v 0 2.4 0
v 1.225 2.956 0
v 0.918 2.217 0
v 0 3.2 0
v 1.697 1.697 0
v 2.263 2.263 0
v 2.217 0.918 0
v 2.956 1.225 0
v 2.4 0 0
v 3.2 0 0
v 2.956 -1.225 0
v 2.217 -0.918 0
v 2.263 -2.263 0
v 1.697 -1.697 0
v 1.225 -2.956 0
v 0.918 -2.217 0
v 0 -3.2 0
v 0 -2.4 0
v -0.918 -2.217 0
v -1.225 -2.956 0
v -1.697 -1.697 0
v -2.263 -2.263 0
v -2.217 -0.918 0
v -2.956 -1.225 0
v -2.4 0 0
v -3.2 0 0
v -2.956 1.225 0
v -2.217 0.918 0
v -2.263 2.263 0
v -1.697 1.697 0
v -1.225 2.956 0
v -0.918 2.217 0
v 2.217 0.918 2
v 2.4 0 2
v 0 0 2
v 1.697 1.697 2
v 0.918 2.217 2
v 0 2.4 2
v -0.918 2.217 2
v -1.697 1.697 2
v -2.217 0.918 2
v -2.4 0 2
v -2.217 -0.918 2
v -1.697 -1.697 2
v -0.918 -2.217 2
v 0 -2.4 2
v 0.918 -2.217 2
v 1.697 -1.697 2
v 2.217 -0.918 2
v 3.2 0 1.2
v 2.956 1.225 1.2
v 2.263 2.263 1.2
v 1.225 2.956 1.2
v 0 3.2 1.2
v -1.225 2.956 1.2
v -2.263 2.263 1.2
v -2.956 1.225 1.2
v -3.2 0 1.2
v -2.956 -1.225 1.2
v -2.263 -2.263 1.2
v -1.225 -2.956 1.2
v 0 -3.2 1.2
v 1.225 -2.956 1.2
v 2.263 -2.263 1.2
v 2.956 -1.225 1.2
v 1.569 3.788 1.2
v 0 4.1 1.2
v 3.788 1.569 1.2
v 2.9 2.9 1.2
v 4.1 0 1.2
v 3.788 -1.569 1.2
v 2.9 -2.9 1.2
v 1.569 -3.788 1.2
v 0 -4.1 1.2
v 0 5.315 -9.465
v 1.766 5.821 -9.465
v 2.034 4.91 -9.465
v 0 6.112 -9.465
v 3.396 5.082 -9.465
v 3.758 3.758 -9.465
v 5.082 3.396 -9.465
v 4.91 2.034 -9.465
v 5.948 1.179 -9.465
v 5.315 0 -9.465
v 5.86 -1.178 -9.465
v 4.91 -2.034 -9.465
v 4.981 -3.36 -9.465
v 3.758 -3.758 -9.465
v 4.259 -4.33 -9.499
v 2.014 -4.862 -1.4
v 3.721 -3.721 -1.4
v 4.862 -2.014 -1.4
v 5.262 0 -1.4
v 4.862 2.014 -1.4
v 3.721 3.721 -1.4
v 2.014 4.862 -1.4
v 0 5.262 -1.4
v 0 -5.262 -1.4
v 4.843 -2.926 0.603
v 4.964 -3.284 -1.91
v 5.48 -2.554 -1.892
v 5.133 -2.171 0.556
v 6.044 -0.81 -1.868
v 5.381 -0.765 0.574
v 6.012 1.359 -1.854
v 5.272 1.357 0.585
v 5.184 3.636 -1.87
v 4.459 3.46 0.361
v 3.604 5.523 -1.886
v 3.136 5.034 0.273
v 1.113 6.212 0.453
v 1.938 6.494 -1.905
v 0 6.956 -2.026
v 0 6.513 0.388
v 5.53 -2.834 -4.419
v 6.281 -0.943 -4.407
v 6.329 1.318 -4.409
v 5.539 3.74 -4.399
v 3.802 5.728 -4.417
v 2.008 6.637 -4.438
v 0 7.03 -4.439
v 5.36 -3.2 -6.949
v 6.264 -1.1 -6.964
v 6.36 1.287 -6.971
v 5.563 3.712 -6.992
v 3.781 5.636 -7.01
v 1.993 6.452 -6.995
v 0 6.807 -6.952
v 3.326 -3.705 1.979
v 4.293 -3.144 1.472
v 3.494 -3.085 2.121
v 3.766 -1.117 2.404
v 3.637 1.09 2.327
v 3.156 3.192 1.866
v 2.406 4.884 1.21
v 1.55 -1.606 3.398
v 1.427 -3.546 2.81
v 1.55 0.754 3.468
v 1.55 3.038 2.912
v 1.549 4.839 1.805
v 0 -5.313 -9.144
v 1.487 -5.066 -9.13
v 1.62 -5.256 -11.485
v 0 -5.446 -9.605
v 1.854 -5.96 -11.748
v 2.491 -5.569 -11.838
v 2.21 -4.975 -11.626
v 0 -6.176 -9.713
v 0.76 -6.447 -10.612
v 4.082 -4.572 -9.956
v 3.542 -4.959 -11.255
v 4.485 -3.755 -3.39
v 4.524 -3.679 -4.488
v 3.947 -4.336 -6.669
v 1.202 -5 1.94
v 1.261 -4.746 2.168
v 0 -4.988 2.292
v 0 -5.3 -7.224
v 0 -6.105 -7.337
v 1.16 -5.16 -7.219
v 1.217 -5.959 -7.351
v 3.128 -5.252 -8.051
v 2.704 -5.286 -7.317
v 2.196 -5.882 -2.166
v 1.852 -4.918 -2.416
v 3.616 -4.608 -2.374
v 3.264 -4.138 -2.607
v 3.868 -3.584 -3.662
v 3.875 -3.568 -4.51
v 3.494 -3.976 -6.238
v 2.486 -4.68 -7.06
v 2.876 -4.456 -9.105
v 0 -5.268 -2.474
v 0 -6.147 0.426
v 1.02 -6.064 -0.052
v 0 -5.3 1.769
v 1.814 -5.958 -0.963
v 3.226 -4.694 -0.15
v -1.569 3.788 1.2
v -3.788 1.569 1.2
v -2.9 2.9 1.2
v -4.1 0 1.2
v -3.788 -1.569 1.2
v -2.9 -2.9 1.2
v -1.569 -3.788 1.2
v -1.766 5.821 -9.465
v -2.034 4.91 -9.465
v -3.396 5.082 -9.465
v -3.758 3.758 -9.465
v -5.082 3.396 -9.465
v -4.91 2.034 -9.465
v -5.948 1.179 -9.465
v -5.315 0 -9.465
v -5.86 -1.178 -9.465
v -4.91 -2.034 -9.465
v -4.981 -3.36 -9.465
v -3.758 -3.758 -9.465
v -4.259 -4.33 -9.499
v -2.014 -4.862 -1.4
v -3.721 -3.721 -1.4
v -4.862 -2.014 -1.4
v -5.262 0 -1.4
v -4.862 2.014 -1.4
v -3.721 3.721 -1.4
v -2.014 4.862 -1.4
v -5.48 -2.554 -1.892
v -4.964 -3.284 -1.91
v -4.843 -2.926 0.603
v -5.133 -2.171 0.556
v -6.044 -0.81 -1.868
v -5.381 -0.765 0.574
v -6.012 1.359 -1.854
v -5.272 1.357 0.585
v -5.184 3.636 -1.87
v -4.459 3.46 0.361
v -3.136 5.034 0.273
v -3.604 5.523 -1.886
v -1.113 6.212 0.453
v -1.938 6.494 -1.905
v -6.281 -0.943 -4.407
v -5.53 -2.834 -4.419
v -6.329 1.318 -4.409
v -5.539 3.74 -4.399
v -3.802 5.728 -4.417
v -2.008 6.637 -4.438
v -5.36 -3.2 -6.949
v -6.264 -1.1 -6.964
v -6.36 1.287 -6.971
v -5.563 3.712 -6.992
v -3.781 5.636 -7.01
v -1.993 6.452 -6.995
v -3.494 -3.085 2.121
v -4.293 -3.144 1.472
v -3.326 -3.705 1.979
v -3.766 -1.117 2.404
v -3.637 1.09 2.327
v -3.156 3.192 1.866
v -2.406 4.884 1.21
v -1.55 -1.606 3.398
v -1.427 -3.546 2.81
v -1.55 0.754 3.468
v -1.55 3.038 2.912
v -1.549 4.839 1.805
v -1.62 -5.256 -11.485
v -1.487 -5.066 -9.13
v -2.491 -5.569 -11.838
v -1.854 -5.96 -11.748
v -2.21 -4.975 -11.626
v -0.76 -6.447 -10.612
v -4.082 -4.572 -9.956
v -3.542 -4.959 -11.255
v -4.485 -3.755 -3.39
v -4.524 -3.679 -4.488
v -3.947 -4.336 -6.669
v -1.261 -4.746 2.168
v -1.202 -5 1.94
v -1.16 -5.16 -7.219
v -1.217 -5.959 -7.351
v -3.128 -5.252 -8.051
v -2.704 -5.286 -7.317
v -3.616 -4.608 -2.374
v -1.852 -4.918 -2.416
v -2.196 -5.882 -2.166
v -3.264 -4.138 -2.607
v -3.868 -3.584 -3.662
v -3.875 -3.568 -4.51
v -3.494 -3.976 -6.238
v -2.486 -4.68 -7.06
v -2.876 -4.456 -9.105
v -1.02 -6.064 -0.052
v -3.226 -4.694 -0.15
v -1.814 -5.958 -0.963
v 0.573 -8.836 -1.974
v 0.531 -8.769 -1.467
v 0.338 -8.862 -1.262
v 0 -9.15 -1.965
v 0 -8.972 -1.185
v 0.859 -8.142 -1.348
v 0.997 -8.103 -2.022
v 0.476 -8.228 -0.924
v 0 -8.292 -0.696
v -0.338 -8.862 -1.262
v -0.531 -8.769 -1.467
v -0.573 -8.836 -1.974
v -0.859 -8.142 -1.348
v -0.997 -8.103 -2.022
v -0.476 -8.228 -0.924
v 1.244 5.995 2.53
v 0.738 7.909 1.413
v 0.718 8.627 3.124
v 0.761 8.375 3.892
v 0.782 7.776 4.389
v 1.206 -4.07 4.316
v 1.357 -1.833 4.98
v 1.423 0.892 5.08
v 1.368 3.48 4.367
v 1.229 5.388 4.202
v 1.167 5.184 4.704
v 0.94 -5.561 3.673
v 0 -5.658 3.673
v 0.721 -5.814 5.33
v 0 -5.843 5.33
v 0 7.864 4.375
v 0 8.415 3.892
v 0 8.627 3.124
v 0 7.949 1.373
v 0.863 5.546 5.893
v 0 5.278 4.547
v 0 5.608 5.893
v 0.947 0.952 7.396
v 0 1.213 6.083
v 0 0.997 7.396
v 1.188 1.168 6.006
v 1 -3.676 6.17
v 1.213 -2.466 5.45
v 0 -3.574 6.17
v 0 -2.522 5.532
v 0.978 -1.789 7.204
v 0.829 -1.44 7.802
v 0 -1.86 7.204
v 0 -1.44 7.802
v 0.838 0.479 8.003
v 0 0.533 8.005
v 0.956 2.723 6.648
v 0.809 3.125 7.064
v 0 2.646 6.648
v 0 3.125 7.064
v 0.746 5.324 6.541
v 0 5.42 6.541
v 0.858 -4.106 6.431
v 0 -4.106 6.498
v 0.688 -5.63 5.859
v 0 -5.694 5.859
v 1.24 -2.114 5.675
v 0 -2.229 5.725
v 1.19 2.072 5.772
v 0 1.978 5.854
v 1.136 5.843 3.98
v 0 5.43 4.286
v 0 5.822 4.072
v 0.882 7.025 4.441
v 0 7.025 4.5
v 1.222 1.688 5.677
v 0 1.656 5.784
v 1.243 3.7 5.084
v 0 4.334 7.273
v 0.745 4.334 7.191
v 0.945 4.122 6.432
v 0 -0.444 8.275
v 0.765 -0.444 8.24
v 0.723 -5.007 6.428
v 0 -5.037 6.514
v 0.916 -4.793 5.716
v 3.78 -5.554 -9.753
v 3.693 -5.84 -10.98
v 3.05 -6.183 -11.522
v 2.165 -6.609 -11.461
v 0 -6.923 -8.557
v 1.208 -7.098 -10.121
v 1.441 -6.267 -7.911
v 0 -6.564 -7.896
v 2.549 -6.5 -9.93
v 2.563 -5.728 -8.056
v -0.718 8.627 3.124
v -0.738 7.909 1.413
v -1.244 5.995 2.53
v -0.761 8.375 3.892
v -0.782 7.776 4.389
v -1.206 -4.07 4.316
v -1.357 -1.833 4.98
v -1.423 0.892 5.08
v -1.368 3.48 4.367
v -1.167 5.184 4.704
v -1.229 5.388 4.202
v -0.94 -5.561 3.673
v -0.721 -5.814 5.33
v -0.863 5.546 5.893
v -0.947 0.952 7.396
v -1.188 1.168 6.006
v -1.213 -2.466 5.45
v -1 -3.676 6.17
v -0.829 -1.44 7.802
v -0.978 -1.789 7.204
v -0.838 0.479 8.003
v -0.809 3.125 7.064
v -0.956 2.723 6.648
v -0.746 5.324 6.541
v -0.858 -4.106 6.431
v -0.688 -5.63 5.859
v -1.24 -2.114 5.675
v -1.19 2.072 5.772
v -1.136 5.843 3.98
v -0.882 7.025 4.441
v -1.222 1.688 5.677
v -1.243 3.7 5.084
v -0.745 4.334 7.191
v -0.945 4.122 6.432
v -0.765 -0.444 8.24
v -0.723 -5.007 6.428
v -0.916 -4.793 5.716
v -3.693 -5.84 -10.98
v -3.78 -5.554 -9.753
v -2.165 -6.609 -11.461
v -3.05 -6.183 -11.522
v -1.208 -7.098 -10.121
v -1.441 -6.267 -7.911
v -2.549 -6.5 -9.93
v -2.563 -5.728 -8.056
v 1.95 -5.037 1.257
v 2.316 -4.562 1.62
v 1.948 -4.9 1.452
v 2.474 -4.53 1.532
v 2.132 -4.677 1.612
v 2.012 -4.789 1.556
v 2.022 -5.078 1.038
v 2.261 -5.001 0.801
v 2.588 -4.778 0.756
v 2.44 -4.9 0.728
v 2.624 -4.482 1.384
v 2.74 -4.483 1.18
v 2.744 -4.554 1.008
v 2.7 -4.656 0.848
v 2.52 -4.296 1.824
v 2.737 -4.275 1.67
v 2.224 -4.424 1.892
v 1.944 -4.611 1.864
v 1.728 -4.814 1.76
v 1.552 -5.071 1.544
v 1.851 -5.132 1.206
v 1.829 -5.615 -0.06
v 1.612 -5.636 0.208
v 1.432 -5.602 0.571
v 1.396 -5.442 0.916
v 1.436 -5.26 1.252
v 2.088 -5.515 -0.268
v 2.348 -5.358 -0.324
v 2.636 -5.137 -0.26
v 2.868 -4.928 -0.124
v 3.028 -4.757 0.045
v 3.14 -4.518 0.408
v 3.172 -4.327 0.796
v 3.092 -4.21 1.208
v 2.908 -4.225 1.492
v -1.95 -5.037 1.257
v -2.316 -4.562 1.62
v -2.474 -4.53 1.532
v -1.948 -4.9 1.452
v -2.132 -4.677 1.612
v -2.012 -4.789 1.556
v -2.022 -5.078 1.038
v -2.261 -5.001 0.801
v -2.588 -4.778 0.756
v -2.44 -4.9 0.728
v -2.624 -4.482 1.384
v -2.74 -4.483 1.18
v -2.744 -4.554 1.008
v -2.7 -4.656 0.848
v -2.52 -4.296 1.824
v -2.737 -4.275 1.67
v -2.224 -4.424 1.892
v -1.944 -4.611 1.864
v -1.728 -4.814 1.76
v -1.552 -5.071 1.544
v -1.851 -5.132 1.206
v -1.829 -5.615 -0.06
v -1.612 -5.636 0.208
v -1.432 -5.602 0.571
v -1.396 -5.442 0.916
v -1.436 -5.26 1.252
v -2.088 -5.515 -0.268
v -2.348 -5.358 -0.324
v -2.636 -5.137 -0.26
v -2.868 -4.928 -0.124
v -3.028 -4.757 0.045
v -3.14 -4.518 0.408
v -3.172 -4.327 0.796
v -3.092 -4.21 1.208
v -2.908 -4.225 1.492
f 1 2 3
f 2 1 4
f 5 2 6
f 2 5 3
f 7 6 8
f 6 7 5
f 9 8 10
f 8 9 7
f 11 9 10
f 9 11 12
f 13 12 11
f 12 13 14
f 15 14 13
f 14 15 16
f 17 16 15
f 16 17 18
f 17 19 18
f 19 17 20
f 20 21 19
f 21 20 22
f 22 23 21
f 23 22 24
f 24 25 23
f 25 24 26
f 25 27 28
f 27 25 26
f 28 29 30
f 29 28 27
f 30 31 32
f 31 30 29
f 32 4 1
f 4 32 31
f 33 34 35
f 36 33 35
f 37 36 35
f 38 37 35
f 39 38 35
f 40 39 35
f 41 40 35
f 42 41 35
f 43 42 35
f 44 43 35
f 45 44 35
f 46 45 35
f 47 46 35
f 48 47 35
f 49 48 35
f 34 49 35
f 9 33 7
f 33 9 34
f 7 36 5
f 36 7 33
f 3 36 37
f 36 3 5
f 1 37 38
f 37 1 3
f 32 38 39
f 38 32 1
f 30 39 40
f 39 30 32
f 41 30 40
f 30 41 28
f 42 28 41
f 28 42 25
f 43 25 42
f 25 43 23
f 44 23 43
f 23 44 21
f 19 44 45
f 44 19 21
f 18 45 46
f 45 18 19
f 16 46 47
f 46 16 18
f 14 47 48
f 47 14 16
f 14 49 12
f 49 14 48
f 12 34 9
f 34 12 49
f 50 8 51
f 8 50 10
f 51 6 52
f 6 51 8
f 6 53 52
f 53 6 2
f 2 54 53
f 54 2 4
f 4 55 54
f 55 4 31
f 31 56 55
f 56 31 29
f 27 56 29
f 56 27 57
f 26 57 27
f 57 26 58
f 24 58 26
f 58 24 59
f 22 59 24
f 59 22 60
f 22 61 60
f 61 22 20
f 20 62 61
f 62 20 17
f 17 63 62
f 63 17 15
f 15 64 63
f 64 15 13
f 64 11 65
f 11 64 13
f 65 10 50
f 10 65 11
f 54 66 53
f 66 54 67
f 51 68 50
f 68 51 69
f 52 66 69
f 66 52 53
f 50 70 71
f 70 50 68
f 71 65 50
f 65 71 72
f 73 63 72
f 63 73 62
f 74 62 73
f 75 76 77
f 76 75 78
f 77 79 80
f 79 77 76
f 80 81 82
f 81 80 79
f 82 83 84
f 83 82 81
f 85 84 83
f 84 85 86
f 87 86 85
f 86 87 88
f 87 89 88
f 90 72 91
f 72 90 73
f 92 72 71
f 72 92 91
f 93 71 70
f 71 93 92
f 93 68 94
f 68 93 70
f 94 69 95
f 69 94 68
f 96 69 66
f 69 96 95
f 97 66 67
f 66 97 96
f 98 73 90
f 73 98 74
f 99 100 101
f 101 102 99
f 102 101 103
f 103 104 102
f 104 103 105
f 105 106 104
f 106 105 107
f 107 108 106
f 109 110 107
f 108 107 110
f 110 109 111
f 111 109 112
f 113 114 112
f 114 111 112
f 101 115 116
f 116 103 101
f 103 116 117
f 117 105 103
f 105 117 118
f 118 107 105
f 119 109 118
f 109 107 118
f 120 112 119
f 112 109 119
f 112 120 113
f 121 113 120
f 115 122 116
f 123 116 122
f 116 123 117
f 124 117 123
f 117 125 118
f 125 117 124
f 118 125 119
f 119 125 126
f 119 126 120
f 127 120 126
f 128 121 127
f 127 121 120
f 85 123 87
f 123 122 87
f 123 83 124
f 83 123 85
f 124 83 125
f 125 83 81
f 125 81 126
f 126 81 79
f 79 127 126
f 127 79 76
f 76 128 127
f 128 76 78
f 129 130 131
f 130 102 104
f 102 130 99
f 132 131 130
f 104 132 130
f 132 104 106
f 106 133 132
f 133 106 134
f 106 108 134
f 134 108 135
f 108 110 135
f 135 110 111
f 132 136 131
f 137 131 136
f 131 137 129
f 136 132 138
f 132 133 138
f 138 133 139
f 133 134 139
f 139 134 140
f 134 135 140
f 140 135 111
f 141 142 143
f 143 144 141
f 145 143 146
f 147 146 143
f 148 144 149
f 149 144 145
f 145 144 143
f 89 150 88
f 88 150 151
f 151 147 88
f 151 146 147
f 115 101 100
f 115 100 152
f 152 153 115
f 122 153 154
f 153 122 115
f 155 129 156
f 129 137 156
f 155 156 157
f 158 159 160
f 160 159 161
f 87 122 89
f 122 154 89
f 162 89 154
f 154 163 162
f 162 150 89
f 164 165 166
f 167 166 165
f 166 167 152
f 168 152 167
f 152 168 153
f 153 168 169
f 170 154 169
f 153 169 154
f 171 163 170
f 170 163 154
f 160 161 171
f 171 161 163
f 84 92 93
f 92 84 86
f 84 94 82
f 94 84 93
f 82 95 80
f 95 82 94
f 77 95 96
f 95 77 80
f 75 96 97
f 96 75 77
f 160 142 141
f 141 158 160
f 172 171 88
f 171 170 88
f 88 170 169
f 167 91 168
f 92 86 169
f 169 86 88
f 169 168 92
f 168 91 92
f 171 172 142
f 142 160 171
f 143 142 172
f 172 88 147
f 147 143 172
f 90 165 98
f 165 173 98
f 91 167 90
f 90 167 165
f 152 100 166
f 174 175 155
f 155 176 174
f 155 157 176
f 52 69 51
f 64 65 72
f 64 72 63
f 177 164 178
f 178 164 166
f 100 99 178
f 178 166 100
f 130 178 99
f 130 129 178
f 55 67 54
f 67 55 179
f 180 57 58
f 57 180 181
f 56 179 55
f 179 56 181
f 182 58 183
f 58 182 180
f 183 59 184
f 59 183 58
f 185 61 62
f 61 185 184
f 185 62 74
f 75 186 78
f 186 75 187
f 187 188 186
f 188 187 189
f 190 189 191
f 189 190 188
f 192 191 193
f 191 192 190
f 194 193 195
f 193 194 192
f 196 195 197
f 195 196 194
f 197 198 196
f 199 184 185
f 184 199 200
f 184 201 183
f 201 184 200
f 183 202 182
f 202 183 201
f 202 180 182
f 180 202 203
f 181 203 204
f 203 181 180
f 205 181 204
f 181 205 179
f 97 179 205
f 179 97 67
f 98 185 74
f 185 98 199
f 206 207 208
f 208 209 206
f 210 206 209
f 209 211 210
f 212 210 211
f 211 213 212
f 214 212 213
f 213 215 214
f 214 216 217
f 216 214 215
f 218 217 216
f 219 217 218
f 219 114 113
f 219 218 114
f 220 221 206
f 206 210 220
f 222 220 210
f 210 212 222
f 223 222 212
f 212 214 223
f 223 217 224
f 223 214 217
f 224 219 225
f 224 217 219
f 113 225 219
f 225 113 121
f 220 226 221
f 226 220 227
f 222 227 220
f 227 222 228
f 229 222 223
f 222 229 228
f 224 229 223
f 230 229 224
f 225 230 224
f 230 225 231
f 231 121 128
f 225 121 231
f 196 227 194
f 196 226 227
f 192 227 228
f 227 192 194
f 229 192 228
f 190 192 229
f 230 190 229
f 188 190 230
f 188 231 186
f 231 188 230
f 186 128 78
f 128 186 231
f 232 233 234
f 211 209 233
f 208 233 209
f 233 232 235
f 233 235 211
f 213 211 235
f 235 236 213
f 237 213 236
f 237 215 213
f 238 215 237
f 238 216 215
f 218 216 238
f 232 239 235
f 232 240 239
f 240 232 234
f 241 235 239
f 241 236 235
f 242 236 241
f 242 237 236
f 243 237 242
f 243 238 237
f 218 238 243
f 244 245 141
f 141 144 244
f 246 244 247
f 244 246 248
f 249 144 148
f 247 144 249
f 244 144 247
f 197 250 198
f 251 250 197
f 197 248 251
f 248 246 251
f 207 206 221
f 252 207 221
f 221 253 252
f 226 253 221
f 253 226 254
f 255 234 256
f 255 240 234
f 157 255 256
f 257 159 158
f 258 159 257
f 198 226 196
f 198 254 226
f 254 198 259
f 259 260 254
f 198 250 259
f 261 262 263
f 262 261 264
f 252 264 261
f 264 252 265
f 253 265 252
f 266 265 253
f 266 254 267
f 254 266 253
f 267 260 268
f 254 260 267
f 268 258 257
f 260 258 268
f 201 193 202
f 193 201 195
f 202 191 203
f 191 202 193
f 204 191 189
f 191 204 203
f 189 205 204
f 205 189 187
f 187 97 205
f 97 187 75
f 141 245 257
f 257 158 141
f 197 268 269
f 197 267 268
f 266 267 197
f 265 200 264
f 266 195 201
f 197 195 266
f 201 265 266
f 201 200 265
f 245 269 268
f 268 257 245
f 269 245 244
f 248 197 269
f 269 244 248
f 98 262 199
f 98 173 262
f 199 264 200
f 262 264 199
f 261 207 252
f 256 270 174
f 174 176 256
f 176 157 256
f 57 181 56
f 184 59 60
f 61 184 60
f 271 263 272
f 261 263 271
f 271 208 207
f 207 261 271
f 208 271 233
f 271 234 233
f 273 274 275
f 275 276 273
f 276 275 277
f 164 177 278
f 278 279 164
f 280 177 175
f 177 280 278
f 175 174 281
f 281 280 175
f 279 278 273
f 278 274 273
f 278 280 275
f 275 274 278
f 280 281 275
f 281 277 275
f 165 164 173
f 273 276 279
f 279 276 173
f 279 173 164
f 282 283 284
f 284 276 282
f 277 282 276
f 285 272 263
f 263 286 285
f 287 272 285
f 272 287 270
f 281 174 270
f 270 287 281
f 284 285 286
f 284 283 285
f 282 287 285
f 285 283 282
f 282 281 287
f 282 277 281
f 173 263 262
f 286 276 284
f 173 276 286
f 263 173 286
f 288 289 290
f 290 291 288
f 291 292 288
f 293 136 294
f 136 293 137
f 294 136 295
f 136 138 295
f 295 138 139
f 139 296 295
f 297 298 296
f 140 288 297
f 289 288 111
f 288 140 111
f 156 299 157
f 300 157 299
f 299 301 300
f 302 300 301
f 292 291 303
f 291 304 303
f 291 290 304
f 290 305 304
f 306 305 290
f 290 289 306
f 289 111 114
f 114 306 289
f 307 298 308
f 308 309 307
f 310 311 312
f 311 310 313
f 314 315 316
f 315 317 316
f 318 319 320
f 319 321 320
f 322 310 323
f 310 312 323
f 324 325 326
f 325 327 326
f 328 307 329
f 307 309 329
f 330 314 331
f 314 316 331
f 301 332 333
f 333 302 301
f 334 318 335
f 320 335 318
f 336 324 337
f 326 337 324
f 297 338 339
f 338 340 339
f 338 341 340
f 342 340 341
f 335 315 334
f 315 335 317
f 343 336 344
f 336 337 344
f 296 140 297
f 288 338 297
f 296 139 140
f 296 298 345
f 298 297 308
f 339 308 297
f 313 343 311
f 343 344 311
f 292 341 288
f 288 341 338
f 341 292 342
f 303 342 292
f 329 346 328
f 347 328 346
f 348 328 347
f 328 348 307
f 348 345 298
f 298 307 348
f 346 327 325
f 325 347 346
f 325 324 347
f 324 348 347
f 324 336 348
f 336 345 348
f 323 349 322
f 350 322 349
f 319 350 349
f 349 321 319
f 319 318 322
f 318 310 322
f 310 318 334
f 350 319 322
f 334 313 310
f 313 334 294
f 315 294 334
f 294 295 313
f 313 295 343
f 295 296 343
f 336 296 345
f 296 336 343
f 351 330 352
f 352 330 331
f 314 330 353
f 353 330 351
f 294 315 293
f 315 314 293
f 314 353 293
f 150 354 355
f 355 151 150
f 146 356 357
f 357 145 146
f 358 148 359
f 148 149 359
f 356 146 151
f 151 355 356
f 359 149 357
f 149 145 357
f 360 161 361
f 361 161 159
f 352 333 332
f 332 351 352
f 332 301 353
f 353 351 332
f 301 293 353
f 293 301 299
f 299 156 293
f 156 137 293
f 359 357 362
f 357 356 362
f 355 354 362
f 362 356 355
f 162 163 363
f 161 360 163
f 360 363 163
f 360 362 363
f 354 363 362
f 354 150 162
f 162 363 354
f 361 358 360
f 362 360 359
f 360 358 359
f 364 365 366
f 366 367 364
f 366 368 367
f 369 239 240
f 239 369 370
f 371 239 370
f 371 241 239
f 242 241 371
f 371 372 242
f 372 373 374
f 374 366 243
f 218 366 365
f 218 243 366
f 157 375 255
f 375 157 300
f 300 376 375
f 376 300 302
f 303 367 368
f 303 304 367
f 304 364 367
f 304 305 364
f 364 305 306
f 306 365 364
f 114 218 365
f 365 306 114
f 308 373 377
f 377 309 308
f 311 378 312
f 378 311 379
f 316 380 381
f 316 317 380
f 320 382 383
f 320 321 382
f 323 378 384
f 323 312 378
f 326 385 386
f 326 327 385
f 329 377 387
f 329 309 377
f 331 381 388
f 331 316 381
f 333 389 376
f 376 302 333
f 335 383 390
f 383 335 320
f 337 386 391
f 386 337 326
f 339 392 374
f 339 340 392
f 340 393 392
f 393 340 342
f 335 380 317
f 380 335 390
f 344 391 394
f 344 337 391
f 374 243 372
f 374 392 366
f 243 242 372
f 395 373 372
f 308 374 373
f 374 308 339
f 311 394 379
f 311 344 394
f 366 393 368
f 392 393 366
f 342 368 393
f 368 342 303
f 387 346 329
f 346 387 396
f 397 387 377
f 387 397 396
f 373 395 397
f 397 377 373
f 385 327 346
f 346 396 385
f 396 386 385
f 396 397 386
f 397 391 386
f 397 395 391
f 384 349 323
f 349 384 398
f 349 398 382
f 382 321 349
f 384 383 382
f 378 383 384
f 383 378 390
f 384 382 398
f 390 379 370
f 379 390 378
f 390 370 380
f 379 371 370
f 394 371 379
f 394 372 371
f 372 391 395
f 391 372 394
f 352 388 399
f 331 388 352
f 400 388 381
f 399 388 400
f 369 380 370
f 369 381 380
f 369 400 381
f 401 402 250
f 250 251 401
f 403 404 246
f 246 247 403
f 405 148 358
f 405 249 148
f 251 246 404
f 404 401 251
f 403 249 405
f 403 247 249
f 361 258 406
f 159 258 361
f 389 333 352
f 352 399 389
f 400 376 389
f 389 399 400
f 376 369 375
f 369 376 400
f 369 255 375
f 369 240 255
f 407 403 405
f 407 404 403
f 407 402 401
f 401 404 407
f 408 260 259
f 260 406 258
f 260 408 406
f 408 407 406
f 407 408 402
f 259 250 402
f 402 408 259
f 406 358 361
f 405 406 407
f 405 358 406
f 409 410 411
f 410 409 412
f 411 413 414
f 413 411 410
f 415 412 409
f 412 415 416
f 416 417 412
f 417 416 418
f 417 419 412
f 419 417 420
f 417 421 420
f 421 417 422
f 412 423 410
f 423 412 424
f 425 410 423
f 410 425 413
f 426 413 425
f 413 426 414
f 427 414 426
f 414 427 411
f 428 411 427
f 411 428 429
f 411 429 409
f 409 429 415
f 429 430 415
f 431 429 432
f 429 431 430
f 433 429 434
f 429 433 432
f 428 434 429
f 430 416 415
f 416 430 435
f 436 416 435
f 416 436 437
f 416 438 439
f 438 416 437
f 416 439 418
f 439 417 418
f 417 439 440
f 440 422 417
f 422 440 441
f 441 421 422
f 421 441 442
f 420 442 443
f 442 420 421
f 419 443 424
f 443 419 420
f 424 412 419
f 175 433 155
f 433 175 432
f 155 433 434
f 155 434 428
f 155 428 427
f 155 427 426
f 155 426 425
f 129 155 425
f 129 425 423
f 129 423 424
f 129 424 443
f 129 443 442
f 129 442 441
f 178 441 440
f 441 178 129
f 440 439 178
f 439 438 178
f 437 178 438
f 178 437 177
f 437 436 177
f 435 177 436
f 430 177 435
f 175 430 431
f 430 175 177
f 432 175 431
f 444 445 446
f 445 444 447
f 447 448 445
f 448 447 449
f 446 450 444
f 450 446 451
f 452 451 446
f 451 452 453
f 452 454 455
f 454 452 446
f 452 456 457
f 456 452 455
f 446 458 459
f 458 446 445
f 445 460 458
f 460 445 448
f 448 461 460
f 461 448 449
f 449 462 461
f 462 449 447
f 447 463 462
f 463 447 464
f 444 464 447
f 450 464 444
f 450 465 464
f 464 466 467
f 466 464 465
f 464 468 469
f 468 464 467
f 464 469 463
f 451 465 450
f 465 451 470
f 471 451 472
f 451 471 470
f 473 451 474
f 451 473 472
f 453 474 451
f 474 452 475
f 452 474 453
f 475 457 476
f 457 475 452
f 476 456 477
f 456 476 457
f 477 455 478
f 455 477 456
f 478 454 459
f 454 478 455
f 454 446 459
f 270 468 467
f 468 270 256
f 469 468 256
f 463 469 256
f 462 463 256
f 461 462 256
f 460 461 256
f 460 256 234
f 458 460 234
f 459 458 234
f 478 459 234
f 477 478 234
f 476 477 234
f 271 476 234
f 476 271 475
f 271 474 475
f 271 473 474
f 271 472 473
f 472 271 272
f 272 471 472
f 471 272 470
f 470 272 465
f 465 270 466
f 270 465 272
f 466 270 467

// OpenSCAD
use <../lib.scad>
use <../p/4-4cylo.scad>
use <s/11262s01.scad>
use <s/11262s02.scad>
use <s/11262s03.scad>
use <../p/stud4o.scad>
$fa=1; $fs=0.2;
function ldraw_lib__11262p01(realsolid=false) = [
// 0 Minifig Headdress Chicken with Yellow Beak and Red Comb and Wattles Pattern
// 0 Name: 11262p01.dat
// 0 Author: Philippe Hurbain [Philo]
// 0 !LDRAW_ORG Part UPDATE 2020-02
// 0 !LICENSE Licensed under CC BY 2.0 and CC BY 4.0 : see CAreadme.txt
// 
// 0 BFC CERTIFY CCW
  [0,"BFC","CERTIFY"],
  [0,"BFC","CCW"],
// 
// 0 !CATEGORY Minifig Headwear
// 0 !KEYWORDS Series 9, Suit, Winter Hut
// 
// 0 !HISTORY 2013-08-14 {LEGO Digital Designer} Original part shape
// 0 !HISTORY 2019-05-19 [Philo] File preparation for LDraw Parts Tracker
// 0 !HISTORY 2020-09-05 [PTadmin] Official Update 2020-02
// 
// 
// 1 16 0 -5 0 -1 0 0 0 -1.25 0 0 0 1 stud4o.dat
  [1,16,0,-5,0,-1,0,0,0,-1.25,0,0,0,1, ldraw_lib__stud4o(realsolid)],
// 1 16 0 -3 0 8 0 0 0 3 0 0 0 8 4-4cylo.dat
  [1,16,0,-3,0,8,0,0,0,3,0,0,0,8, ldraw_lib__4_4cylo(realsolid)],
// 1 16 0 0 0 1 0 0 0 1 0 0 0 1 s\11262s01.dat
  [1,16,0,0,0,1,0,0,0,1,0,0,0,1, ldraw_lib__s__11262s01(realsolid)],
// 1 16 0 0 0 -1 0 0 0 1 0 0 0 1 s\11262s01.dat
  [1,16,0,0,0,-1,0,0,0,1,0,0,0,1, ldraw_lib__s__11262s01(realsolid)],
// 1 14 0 0 0 1 0 0 0 1 0 0 0 1 s\11262s02.dat
  [1,14,0,0,0,1,0,0,0,1,0,0,0,1, ldraw_lib__s__11262s02(realsolid)],
// 1 14 0 0 0 -1 0 0 0 1 0 0 0 1 s\11262s02.dat
  [1,14,0,0,0,-1,0,0,0,1,0,0,0,1, ldraw_lib__s__11262s02(realsolid)],
// 1 4 0 0 0 1 0 0 0 1 0 0 0 1 s\11262s03.dat
  [1,4,0,0,0,1,0,0,0,1,0,0,0,1, ldraw_lib__s__11262s03(realsolid)],
// 1 4 0 0 0 -1 0 0 0 1 0 0 0 1 s\11262s03.dat
  [1,4,0,0,0,-1,0,0,0,1,0,0,0,1, ldraw_lib__s__11262s03(realsolid)],
// 0 // eyes
// 4 15 4.87 -3.63 -12.2511 4.8738 -3.1437 -12.5932 6.1842 -3.8302 -11.325 5.79 -4.05 -11.4046
  [4,15,4.87,-3.63,-12.2511,4.8738,-3.1437,-12.5932,6.1842,-3.8302,-11.325,5.79,-4.05,-11.4046],
// 4 15 4.87 -3.63 -12.2511 5.79 -4.05 -11.4046 5.33 -4.03 -11.6933 5.03 -3.89 -11.9715
  [4,15,4.87,-3.63,-12.2511,5.79,-4.05,-11.4046,5.33,-4.03,-11.6933,5.03,-3.89,-11.9715],
// 4 15 6.1842 -3.8302 -11.325 4.8738 -3.1437 -12.5932 5.0544 -2.5943 -12.6949 5.6537 -2.0031 -12.5035
  [4,15,6.1842,-3.8302,-11.325,4.8738,-3.1437,-12.5932,5.0544,-2.5943,-12.6949,5.6537,-2.0031,-12.5035],
// 4 15 6.1842 -3.8302 -11.325 5.6537 -2.0031 -12.5035 6.1 -1.82 -12.2506 6.47 -1.89 -11.9457
  [4,15,6.1842,-3.8302,-11.325,5.6537,-2.0031,-12.5035,6.1,-1.82,-12.2506,6.47,-1.89,-11.9457],
// 4 15 6.56 -3.46 -11.2048 6.1842 -3.8302 -11.325 6.47 -1.89 -11.9457 6.85 -2.95 -11.2083
  [4,15,6.56,-3.46,-11.2048,6.1842,-3.8302,-11.325,6.47,-1.89,-11.9457,6.85,-2.95,-11.2083],
// 4 15 6.86 -2.52 -11.3855 6.85 -2.95 -11.2083 6.47 -1.89 -11.9457 6.75 -2.12 -11.6389
  [4,15,6.86,-2.52,-11.3855,6.85,-2.95,-11.2083,6.47,-1.89,-11.9457,6.75,-2.12,-11.6389],
// 4 0 6.1842 -3.8302 -11.325 6.8429 -4.1753 -10.6875 6.3 -4.56 -10.7391 5.79 -4.05 -11.4046
  [4,0,6.1842,-3.8302,-11.325,6.8429,-4.1753,-10.6875,6.3,-4.56,-10.7391,5.79,-4.05,-11.4046],
// 4 0 5.79 -4.05 -11.4046 6.3 -4.56 -10.7391 5.56 -4.73 -11.0604 5.33 -4.03 -11.6933
  [4,0,5.79,-4.05,-11.4046,6.3,-4.56,-10.7391,5.56,-4.73,-11.0604,5.33,-4.03,-11.6933],
// 4 0 5.33 -4.03 -11.6933 5.56 -4.73 -11.0604 4.86 -4.66 -11.5277 5.03 -3.89 -11.9715
  [4,0,5.33,-4.03,-11.6933,5.56,-4.73,-11.0604,4.86,-4.66,-11.5277,5.03,-3.89,-11.9715],
// 4 0 5.03 -3.89 -11.9715 4.86 -4.66 -11.5277 4.32 -4.4 -12.034 4.87 -3.63 -12.2511
  [4,0,5.03,-3.89,-11.9715,4.86,-4.66,-11.5277,4.32,-4.4,-12.034,4.87,-3.63,-12.2511],
// 4 0 4.87 -3.63 -12.2511 4.32 -4.4 -12.034 3.8798 -3.8609 -12.6785 4.628 -3.015 -12.831
  [4,0,4.87,-3.63,-12.2511,4.32,-4.4,-12.034,3.8798,-3.8609,-12.6785,4.628,-3.015,-12.831],
// 3 0 4.87 -3.63 -12.2511 4.628 -3.015 -12.831 4.8738 -3.1437 -12.5932
  [3,0,4.87,-3.63,-12.2511,4.628,-3.015,-12.831,4.8738,-3.1437,-12.5932],
// 3 0 4.8738 -3.1437 -12.5932 4.628 -3.015 -12.831 5.0544 -2.5943 -12.6949
  [3,0,4.8738,-3.1437,-12.5932,4.628,-3.015,-12.831,5.0544,-2.5943,-12.6949],
// 3 0 4.628 -3.015 -12.831 4.5731 0.1497 -14.0363 5.0544 -2.5943 -12.6949
  [3,0,4.628,-3.015,-12.831,4.5731,0.1497,-14.0363,5.0544,-2.5943,-12.6949],
// 4 0 4.03 -0.52 -14.0908 4.5731 0.1497 -14.0363 4.628 -3.015 -12.831 3.5788 -1.4274 -14.0058
  [4,0,4.03,-0.52,-14.0908,4.5731,0.1497,-14.0363,4.628,-3.015,-12.831,3.5788,-1.4274,-14.0058],
// 4 0 3.49 -2.29 -13.6061 3.5788 -1.4274 -14.0058 4.628 -3.015 -12.831 3.59 -3.13 -13.1494
  [4,0,3.49,-2.29,-13.6061,3.5788,-1.4274,-14.0058,4.628,-3.015,-12.831,3.59,-3.13,-13.1494],
// 3 0 3.8798 -3.8609 -12.6785 3.59 -3.13 -13.1494 4.628 -3.015 -12.831
  [3,0,3.8798,-3.8609,-12.6785,3.59,-3.13,-13.1494,4.628,-3.015,-12.831],
// 4 0 5.6537 -2.0031 -12.5035 5.0544 -2.5943 -12.6949 4.5731 0.1497 -14.0363 5.22 0.67 -13.7863
  [4,0,5.6537,-2.0031,-12.5035,5.0544,-2.5943,-12.6949,4.5731,0.1497,-14.0363,5.22,0.67,-13.7863],
// 4 0 5.6537 -2.0031 -12.5035 5.22 0.67 -13.7863 5.87 0.81 -13.3938 6.59 0.65 -12.8427
  [4,0,5.6537,-2.0031,-12.5035,5.22,0.67,-13.7863,5.87,0.81,-13.3938,6.59,0.65,-12.8427],
// 4 0 5.6537 -2.0031 -12.5035 6.59 0.65 -12.8427 7.17 0.31 -12.3209 7.5711 -0.1113 -11.8914
  [4,0,5.6537,-2.0031,-12.5035,6.59,0.65,-12.8427,7.17,0.31,-12.3209,7.5711,-0.1113,-11.8914],
// 3 0 5.6537 -2.0031 -12.5035 7.5711 -0.1113 -11.8914 6.1 -1.82 -12.2506
  [3,0,5.6537,-2.0031,-12.5035,7.5711,-0.1113,-11.8914,6.1,-1.82,-12.2506],
// 4 0 6.47 -1.89 -11.9457 6.1 -1.82 -12.2506 7.5711 -0.1113 -11.8914 7.85 -1.02 -11.2941
  [4,0,6.47,-1.89,-11.9457,6.1,-1.82,-12.2506,7.5711,-0.1113,-11.8914,7.85,-1.02,-11.2941],
// 4 0 6.75 -2.12 -11.6389 6.47 -1.89 -11.9457 7.85 -1.02 -11.2941 7.93 -1.99 -10.8182
  [4,0,6.75,-2.12,-11.6389,6.47,-1.89,-11.9457,7.85,-1.02,-11.2941,7.93,-1.99,-10.8182],
// 4 0 6.86 -2.52 -11.3855 6.75 -2.12 -11.6389 7.93 -1.99 -10.8182 7.73 -3.02 -10.5246
  [4,0,6.86,-2.52,-11.3855,6.75,-2.12,-11.6389,7.93,-1.99,-10.8182,7.73,-3.02,-10.5246],
// 4 0 6.85 -2.95 -11.2083 6.86 -2.52 -11.3855 7.73 -3.02 -10.5246 7.27 -3.73 -10.5615
  [4,0,6.85,-2.95,-11.2083,6.86,-2.52,-11.3855,7.73,-3.02,-10.5246,7.27,-3.73,-10.5615],
// 4 0 6.56 -3.46 -11.2048 6.85 -2.95 -11.2083 7.27 -3.73 -10.5615 6.8429 -4.1753 -10.6875
  [4,0,6.56,-3.46,-11.2048,6.85,-2.95,-11.2083,7.27,-3.73,-10.5615,6.8429,-4.1753,-10.6875],
// 3 0 6.8429 -4.1753 -10.6875 6.1842 -3.8302 -11.325 6.56 -3.46 -11.2048
  [3,0,6.8429,-4.1753,-10.6875,6.1842,-3.8302,-11.325,6.56,-3.46,-11.2048],
// 4 16 2.549 0.131 -15.159 3.5788 -1.4274 -14.0058 3.49 -2.29 -13.6061 3.004 -4.851 -12.5
  [4,16,2.549,0.131,-15.159,3.5788,-1.4274,-14.0058,3.49,-2.29,-13.6061,3.004,-4.851,-12.5],
// 3 16 3.004 -4.851 -12.5 3.49 -2.29 -13.6061 3.59 -3.13 -13.1494
  [3,16,3.004,-4.851,-12.5,3.49,-2.29,-13.6061,3.59,-3.13,-13.1494],
// 3 16 3.004 -4.851 -12.5 3.59 -3.13 -13.1494 3.8798 -3.8609 -12.6785
  [3,16,3.004,-4.851,-12.5,3.59,-3.13,-13.1494,3.8798,-3.8609,-12.6785],
// 3 16 3.004 -4.851 -12.5 3.8798 -3.8609 -12.6785 4.32 -4.4 -12.034
  [3,16,3.004,-4.851,-12.5,3.8798,-3.8609,-12.6785,4.32,-4.4,-12.034],
// 3 16 3.004 -4.851 -12.5 4.32 -4.4 -12.034 4.86 -4.66 -11.5277
  [3,16,3.004,-4.851,-12.5,4.32,-4.4,-12.034,4.86,-4.66,-11.5277],
// 3 16 3.004 -4.851 -12.5 4.86 -4.66 -11.5277 5.56 -4.73 -11.0604
  [3,16,3.004,-4.851,-12.5,4.86,-4.66,-11.5277,5.56,-4.73,-11.0604],
// 3 16 8.316 -4.947 -9.262 3.004 -4.851 -12.5 5.56 -4.73 -11.0604
  [3,16,8.316,-4.947,-9.262,3.004,-4.851,-12.5,5.56,-4.73,-11.0604],
// 3 16 8.316 -4.947 -9.262 5.56 -4.73 -11.0604 6.3 -4.56 -10.7391
  [3,16,8.316,-4.947,-9.262,5.56,-4.73,-11.0604,6.3,-4.56,-10.7391],
// 3 16 8.316 -4.947 -9.262 6.3 -4.56 -10.7391 6.8429 -4.1753 -10.6875
  [3,16,8.316,-4.947,-9.262,6.3,-4.56,-10.7391,6.8429,-4.1753,-10.6875],
// 3 16 8.316 -4.947 -9.262 6.8429 -4.1753 -10.6875 7.27 -3.73 -10.5615
  [3,16,8.316,-4.947,-9.262,6.8429,-4.1753,-10.6875,7.27,-3.73,-10.5615],
// 3 16 8.316 -4.947 -9.262 7.27 -3.73 -10.5615 7.73 -3.02 -10.5246
  [3,16,8.316,-4.947,-9.262,7.27,-3.73,-10.5615,7.73,-3.02,-10.5246],
// 3 16 8.316 -4.947 -9.262 7.73 -3.02 -10.5246 7.93 -1.99 -10.8182
  [3,16,8.316,-4.947,-9.262,7.73,-3.02,-10.5246,7.93,-1.99,-10.8182],
// 4 16 8.064 0.375 -11.734 8.316 -4.947 -9.262 7.93 -1.99 -10.8182 7.85 -1.02 -11.2941
  [4,16,8.064,0.375,-11.734,8.316,-4.947,-9.262,7.93,-1.99,-10.8182,7.85,-1.02,-11.2941],
// 3 16 7.85 -1.02 -11.2941 7.5711 -0.1113 -11.8914 8.064 0.375 -11.734
  [3,16,7.85,-1.02,-11.2941,7.5711,-0.1113,-11.8914,8.064,0.375,-11.734],
// 3 16 7.5711 -0.1113 -11.8914 7.17 0.31 -12.3209 8.064 0.375 -11.734
  [3,16,7.5711,-0.1113,-11.8914,7.17,0.31,-12.3209,8.064,0.375,-11.734],
// 4 16 8.064 0.375 -11.734 7.17 0.31 -12.3209 6.59 0.65 -12.8427 4.534 2.407 -14.896
  [4,16,8.064,0.375,-11.734,7.17,0.31,-12.3209,6.59,0.65,-12.8427,4.534,2.407,-14.896],
// 3 16 6.59 0.65 -12.8427 5.87 0.81 -13.3938 4.534 2.407 -14.896
  [3,16,6.59,0.65,-12.8427,5.87,0.81,-13.3938,4.534,2.407,-14.896],
// 3 16 5.22 0.67 -13.7863 4.534 2.407 -14.896 5.87 0.81 -13.3938
  [3,16,5.22,0.67,-13.7863,4.534,2.407,-14.896,5.87,0.81,-13.3938],
// 3 16 4.5731 0.1497 -14.0363 4.534 2.407 -14.896 5.22 0.67 -13.7863
  [3,16,4.5731,0.1497,-14.0363,4.534,2.407,-14.896,5.22,0.67,-13.7863],
// 4 16 4.534 2.407 -14.896 4.5731 0.1497 -14.0363 4.03 -0.52 -14.0908 2.549 0.131 -15.159
  [4,16,4.534,2.407,-14.896,4.5731,0.1497,-14.0363,4.03,-0.52,-14.0908,2.549,0.131,-15.159],
// 3 16 3.5788 -1.4274 -14.0058 2.549 0.131 -15.159 4.03 -0.52 -14.0908
  [3,16,3.5788,-1.4274,-14.0058,2.549,0.131,-15.159,4.03,-0.52,-14.0908],
// 5 24 4.628 -3.015 -12.831 3.004 -4.851 -12.5 2.549 0.131 -15.159 8.316 -4.947 -9.262
  [5,24,4.628,-3.015,-12.831,3.004,-4.851,-12.5,2.549,0.131,-15.159,8.316,-4.947,-9.262],
// 5 24 4.628 -3.015 -12.831 4.534 2.407 -14.896 8.064 0.375 -11.734 2.549 0.131 -15.159
  [5,24,4.628,-3.015,-12.831,4.534,2.407,-14.896,8.064,0.375,-11.734,2.549,0.131,-15.159],
// 5 24 8.316 -4.947 -9.262 4.628 -3.015 -12.831 8.064 0.375 -11.734 3.004 -4.851 -12.5
  [5,24,8.316,-4.947,-9.262,4.628,-3.015,-12.831,8.064,0.375,-11.734,3.004,-4.851,-12.5],
// 5 24 4.628 -3.015 -12.831 8.064 0.375 -11.734 4.534 2.407 -14.896 8.316 -4.947 -9.262
  [5,24,4.628,-3.015,-12.831,8.064,0.375,-11.734,4.534,2.407,-14.896,8.316,-4.947,-9.262],
// 5 24 2.549 .131 -15.159 4.628 -3.015 -12.831 3.004 -4.851 -12.5 4.534 2.407 -14.896
  [5,24,2.549,.131,-15.159,4.628,-3.015,-12.831,3.004,-4.851,-12.5,4.534,2.407,-14.896],
// 
// 4 15 -5.79 -4.05 -11.4046 -6.1842 -3.8302 -11.325 -4.8738 -3.1437 -12.5932 -4.87 -3.63 -12.2511
  [4,15,-5.79,-4.05,-11.4046,-6.1842,-3.8302,-11.325,-4.8738,-3.1437,-12.5932,-4.87,-3.63,-12.2511],
// 4 15 -5.03 -3.89 -11.9715 -5.33 -4.03 -11.6933 -5.79 -4.05 -11.4046 -4.87 -3.63 -12.2511
  [4,15,-5.03,-3.89,-11.9715,-5.33,-4.03,-11.6933,-5.79,-4.05,-11.4046,-4.87,-3.63,-12.2511],
// 4 15 -5.6537 -2.0031 -12.5035 -5.0544 -2.5943 -12.6949 -4.8738 -3.1437 -12.5932 -6.1842 -3.8302 -11.325
  [4,15,-5.6537,-2.0031,-12.5035,-5.0544,-2.5943,-12.6949,-4.8738,-3.1437,-12.5932,-6.1842,-3.8302,-11.325],
// 4 15 -6.47 -1.89 -11.9457 -6.1 -1.82 -12.2506 -5.6537 -2.0031 -12.5035 -6.1842 -3.8302 -11.325
  [4,15,-6.47,-1.89,-11.9457,-6.1,-1.82,-12.2506,-5.6537,-2.0031,-12.5035,-6.1842,-3.8302,-11.325],
// 4 15 -6.85 -2.95 -11.2083 -6.47 -1.89 -11.9457 -6.1842 -3.8302 -11.325 -6.56 -3.46 -11.2048
  [4,15,-6.85,-2.95,-11.2083,-6.47,-1.89,-11.9457,-6.1842,-3.8302,-11.325,-6.56,-3.46,-11.2048],
// 4 15 -6.75 -2.12 -11.6389 -6.47 -1.89 -11.9457 -6.85 -2.95 -11.2083 -6.86 -2.52 -11.3855
  [4,15,-6.75,-2.12,-11.6389,-6.47,-1.89,-11.9457,-6.85,-2.95,-11.2083,-6.86,-2.52,-11.3855],
// 4 0 -5.79 -4.05 -11.4046 -6.3 -4.56 -10.7391 -6.8429 -4.1753 -10.6875 -6.1842 -3.8302 -11.325
  [4,0,-5.79,-4.05,-11.4046,-6.3,-4.56,-10.7391,-6.8429,-4.1753,-10.6875,-6.1842,-3.8302,-11.325],
// 4 0 -5.33 -4.03 -11.6933 -5.56 -4.73 -11.0604 -6.3 -4.56 -10.7391 -5.79 -4.05 -11.4046
  [4,0,-5.33,-4.03,-11.6933,-5.56,-4.73,-11.0604,-6.3,-4.56,-10.7391,-5.79,-4.05,-11.4046],
// 4 0 -5.03 -3.89 -11.9715 -4.86 -4.66 -11.5277 -5.56 -4.73 -11.0604 -5.33 -4.03 -11.6933
  [4,0,-5.03,-3.89,-11.9715,-4.86,-4.66,-11.5277,-5.56,-4.73,-11.0604,-5.33,-4.03,-11.6933],
// 4 0 -4.87 -3.63 -12.2511 -4.32 -4.4 -12.034 -4.86 -4.66 -11.5277 -5.03 -3.89 -11.9715
  [4,0,-4.87,-3.63,-12.2511,-4.32,-4.4,-12.034,-4.86,-4.66,-11.5277,-5.03,-3.89,-11.9715],
// 4 0 -4.628 -3.015 -12.831 -3.8798 -3.8609 -12.6785 -4.32 -4.4 -12.034 -4.87 -3.63 -12.2511
  [4,0,-4.628,-3.015,-12.831,-3.8798,-3.8609,-12.6785,-4.32,-4.4,-12.034,-4.87,-3.63,-12.2511],
// 3 0 -4.8738 -3.1437 -12.5932 -4.628 -3.015 -12.831 -4.87 -3.63 -12.2511
  [3,0,-4.8738,-3.1437,-12.5932,-4.628,-3.015,-12.831,-4.87,-3.63,-12.2511],
// 3 0 -5.0544 -2.5943 -12.6949 -4.628 -3.015 -12.831 -4.8738 -3.1437 -12.5932
  [3,0,-5.0544,-2.5943,-12.6949,-4.628,-3.015,-12.831,-4.8738,-3.1437,-12.5932],
// 3 0 -5.0544 -2.5943 -12.6949 -4.5731 0.1497 -14.0363 -4.628 -3.015 -12.831
  [3,0,-5.0544,-2.5943,-12.6949,-4.5731,0.1497,-14.0363,-4.628,-3.015,-12.831],
// 4 0 -3.5788 -1.4274 -14.0058 -4.628 -3.015 -12.831 -4.5731 0.1497 -14.0363 -4.03 -0.52 -14.0908
  [4,0,-3.5788,-1.4274,-14.0058,-4.628,-3.015,-12.831,-4.5731,0.1497,-14.0363,-4.03,-0.52,-14.0908],
// 4 0 -3.59 -3.13 -13.1494 -4.628 -3.015 -12.831 -3.5788 -1.4274 -14.0058 -3.49 -2.29 -13.6061
  [4,0,-3.59,-3.13,-13.1494,-4.628,-3.015,-12.831,-3.5788,-1.4274,-14.0058,-3.49,-2.29,-13.6061],
// 3 0 -4.628 -3.015 -12.831 -3.59 -3.13 -13.1494 -3.8798 -3.8609 -12.6785
  [3,0,-4.628,-3.015,-12.831,-3.59,-3.13,-13.1494,-3.8798,-3.8609,-12.6785],
// 4 0 -5.22 0.67 -13.7863 -4.5731 0.1497 -14.0363 -5.0544 -2.5943 -12.6949 -5.6537 -2.0031 -12.5035
  [4,0,-5.22,0.67,-13.7863,-4.5731,0.1497,-14.0363,-5.0544,-2.5943,-12.6949,-5.6537,-2.0031,-12.5035],
// 4 0 -6.59 0.65 -12.8427 -5.87 0.81 -13.3938 -5.22 0.67 -13.7863 -5.6537 -2.0031 -12.5035
  [4,0,-6.59,0.65,-12.8427,-5.87,0.81,-13.3938,-5.22,0.67,-13.7863,-5.6537,-2.0031,-12.5035],
// 4 0 -7.5711 -0.1113 -11.8914 -7.17 0.31 -12.3209 -6.59 0.65 -12.8427 -5.6537 -2.0031 -12.5035
  [4,0,-7.5711,-0.1113,-11.8914,-7.17,0.31,-12.3209,-6.59,0.65,-12.8427,-5.6537,-2.0031,-12.5035],
// 3 0 -6.1 -1.82 -12.2506 -7.5711 -0.1113 -11.8914 -5.6537 -2.0031 -12.5035
  [3,0,-6.1,-1.82,-12.2506,-7.5711,-0.1113,-11.8914,-5.6537,-2.0031,-12.5035],
// 4 0 -7.85 -1.02 -11.2941 -7.5711 -0.1113 -11.8914 -6.1 -1.82 -12.2506 -6.47 -1.89 -11.9457
  [4,0,-7.85,-1.02,-11.2941,-7.5711,-0.1113,-11.8914,-6.1,-1.82,-12.2506,-6.47,-1.89,-11.9457],
// 4 0 -7.93 -1.99 -10.8182 -7.85 -1.02 -11.2941 -6.47 -1.89 -11.9457 -6.75 -2.12 -11.6389
  [4,0,-7.93,-1.99,-10.8182,-7.85,-1.02,-11.2941,-6.47,-1.89,-11.9457,-6.75,-2.12,-11.6389],
// 4 0 -7.73 -3.02 -10.5246 -7.93 -1.99 -10.8182 -6.75 -2.12 -11.6389 -6.86 -2.52 -11.3855
  [4,0,-7.73,-3.02,-10.5246,-7.93,-1.99,-10.8182,-6.75,-2.12,-11.6389,-6.86,-2.52,-11.3855],
// 4 0 -7.27 -3.73 -10.5615 -7.73 -3.02 -10.5246 -6.86 -2.52 -11.3855 -6.85 -2.95 -11.2083
  [4,0,-7.27,-3.73,-10.5615,-7.73,-3.02,-10.5246,-6.86,-2.52,-11.3855,-6.85,-2.95,-11.2083],
// 4 0 -6.8429 -4.1753 -10.6875 -7.27 -3.73 -10.5615 -6.85 -2.95 -11.2083 -6.56 -3.46 -11.2048
  [4,0,-6.8429,-4.1753,-10.6875,-7.27,-3.73,-10.5615,-6.85,-2.95,-11.2083,-6.56,-3.46,-11.2048],
// 3 0 -6.56 -3.46 -11.2048 -6.1842 -3.8302 -11.325 -6.8429 -4.1753 -10.6875
  [3,0,-6.56,-3.46,-11.2048,-6.1842,-3.8302,-11.325,-6.8429,-4.1753,-10.6875],
// 4 16 -3.004 -4.851 -12.5 -3.49 -2.29 -13.6061 -3.5788 -1.4274 -14.0058 -2.549 0.131 -15.159
  [4,16,-3.004,-4.851,-12.5,-3.49,-2.29,-13.6061,-3.5788,-1.4274,-14.0058,-2.549,0.131,-15.159],
// 3 16 -3.59 -3.13 -13.1494 -3.49 -2.29 -13.6061 -3.004 -4.851 -12.5
  [3,16,-3.59,-3.13,-13.1494,-3.49,-2.29,-13.6061,-3.004,-4.851,-12.5],
// 3 16 -3.8798 -3.8609 -12.6785 -3.59 -3.13 -13.1494 -3.004 -4.851 -12.5
  [3,16,-3.8798,-3.8609,-12.6785,-3.59,-3.13,-13.1494,-3.004,-4.851,-12.5],
// 3 16 -4.32 -4.4 -12.034 -3.8798 -3.8609 -12.6785 -3.004 -4.851 -12.5
  [3,16,-4.32,-4.4,-12.034,-3.8798,-3.8609,-12.6785,-3.004,-4.851,-12.5],
// 3 16 -4.86 -4.66 -11.5277 -4.32 -4.4 -12.034 -3.004 -4.851 -12.5
  [3,16,-4.86,-4.66,-11.5277,-4.32,-4.4,-12.034,-3.004,-4.851,-12.5],
// 3 16 -5.56 -4.73 -11.0604 -4.86 -4.66 -11.5277 -3.004 -4.851 -12.5
  [3,16,-5.56,-4.73,-11.0604,-4.86,-4.66,-11.5277,-3.004,-4.851,-12.5],
// 3 16 -5.56 -4.73 -11.0604 -3.004 -4.851 -12.5 -8.316 -4.947 -9.262
  [3,16,-5.56,-4.73,-11.0604,-3.004,-4.851,-12.5,-8.316,-4.947,-9.262],
// 3 16 -6.3 -4.56 -10.7391 -5.56 -4.73 -11.0604 -8.316 -4.947 -9.262
  [3,16,-6.3,-4.56,-10.7391,-5.56,-4.73,-11.0604,-8.316,-4.947,-9.262],
// 3 16 -6.8429 -4.1753 -10.6875 -6.3 -4.56 -10.7391 -8.316 -4.947 -9.262
  [3,16,-6.8429,-4.1753,-10.6875,-6.3,-4.56,-10.7391,-8.316,-4.947,-9.262],
// 3 16 -7.27 -3.73 -10.5615 -6.8429 -4.1753 -10.6875 -8.316 -4.947 -9.262
  [3,16,-7.27,-3.73,-10.5615,-6.8429,-4.1753,-10.6875,-8.316,-4.947,-9.262],
// 3 16 -7.73 -3.02 -10.5246 -7.27 -3.73 -10.5615 -8.316 -4.947 -9.262
  [3,16,-7.73,-3.02,-10.5246,-7.27,-3.73,-10.5615,-8.316,-4.947,-9.262],
// 3 16 -7.93 -1.99 -10.8182 -7.73 -3.02 -10.5246 -8.316 -4.947 -9.262
  [3,16,-7.93,-1.99,-10.8182,-7.73,-3.02,-10.5246,-8.316,-4.947,-9.262],
// 4 16 -7.85 -1.02 -11.2941 -7.93 -1.99 -10.8182 -8.316 -4.947 -9.262 -8.064 0.375 -11.734
  [4,16,-7.85,-1.02,-11.2941,-7.93,-1.99,-10.8182,-8.316,-4.947,-9.262,-8.064,0.375,-11.734],
// 3 16 -8.064 0.375 -11.734 -7.5711 -0.1113 -11.8914 -7.85 -1.02 -11.2941
  [3,16,-8.064,0.375,-11.734,-7.5711,-0.1113,-11.8914,-7.85,-1.02,-11.2941],
// 3 16 -8.064 0.375 -11.734 -7.17 0.31 -12.3209 -7.5711 -0.1113 -11.8914
  [3,16,-8.064,0.375,-11.734,-7.17,0.31,-12.3209,-7.5711,-0.1113,-11.8914],
// 4 16 -4.534 2.407 -14.896 -6.59 0.65 -12.8427 -7.17 0.31 -12.3209 -8.064 0.375 -11.734
  [4,16,-4.534,2.407,-14.896,-6.59,0.65,-12.8427,-7.17,0.31,-12.3209,-8.064,0.375,-11.734],
// 3 16 -4.534 2.407 -14.896 -5.87 0.81 -13.3938 -6.59 0.65 -12.8427
  [3,16,-4.534,2.407,-14.896,-5.87,0.81,-13.3938,-6.59,0.65,-12.8427],
// 3 16 -5.87 0.81 -13.3938 -4.534 2.407 -14.896 -5.22 0.67 -13.7863
  [3,16,-5.87,0.81,-13.3938,-4.534,2.407,-14.896,-5.22,0.67,-13.7863],
// 3 16 -5.22 0.67 -13.7863 -4.534 2.407 -14.896 -4.5731 0.1497 -14.0363
  [3,16,-5.22,0.67,-13.7863,-4.534,2.407,-14.896,-4.5731,0.1497,-14.0363],
// 4 16 -2.549 0.131 -15.159 -4.03 -0.52 -14.0908 -4.5731 0.1497 -14.0363 -4.534 2.407 -14.896
  [4,16,-2.549,0.131,-15.159,-4.03,-0.52,-14.0908,-4.5731,0.1497,-14.0363,-4.534,2.407,-14.896],
// 3 16 -4.03 -0.52 -14.0908 -2.549 0.131 -15.159 -3.5788 -1.4274 -14.0058
  [3,16,-4.03,-0.52,-14.0908,-2.549,0.131,-15.159,-3.5788,-1.4274,-14.0058],
// 5 24 -2.549 0.131 -15.159 -4.628 -3.015 -12.831 -3.004 -4.851 -12.5 -4.534 2.407 -14.896
  [5,24,-2.549,0.131,-15.159,-4.628,-3.015,-12.831,-3.004,-4.851,-12.5,-4.534,2.407,-14.896],
// 5 24 -4.628 -3.015 -12.831 -3.004 -4.851 -12.5 -2.549 0.131 -15.159 -8.316 -4.947 -9.262
  [5,24,-4.628,-3.015,-12.831,-3.004,-4.851,-12.5,-2.549,0.131,-15.159,-8.316,-4.947,-9.262],
// 5 24 -4.628 -3.015 -12.831 -4.534 2.407 -14.896 -8.064 0.375 -11.734 -2.549 0.131 -15.159
  [5,24,-4.628,-3.015,-12.831,-4.534,2.407,-14.896,-8.064,0.375,-11.734,-2.549,0.131,-15.159],
// 5 24 -8.316 -4.947 -9.262 -4.628 -3.015 -12.831 -8.064 0.375 -11.734 -3.004 -4.851 -12.5
  [5,24,-8.316,-4.947,-9.262,-4.628,-3.015,-12.831,-8.064,0.375,-11.734,-3.004,-4.851,-12.5],
// 5 24 -4.628 -3.015 -12.831 -8.064 0.375 -11.734 -4.534 2.407 -14.896 -8.316 -4.947 -9.262
  [5,24,-4.628,-3.015,-12.831,-8.064,0.375,-11.734,-4.534,2.407,-14.896,-8.316,-4.947,-9.262],
];
module ldraw_lib__11262p01(step=0, col=false, unit=2/5, alt=false, line=0.2, solid=!$preview)
    makepoly(ldraw_lib__11262p01(solid), step=step, col=col, unit=unit, alt=alt, line=line, solid=solid);
ldraw_lib__11262p01(line=0.2);
